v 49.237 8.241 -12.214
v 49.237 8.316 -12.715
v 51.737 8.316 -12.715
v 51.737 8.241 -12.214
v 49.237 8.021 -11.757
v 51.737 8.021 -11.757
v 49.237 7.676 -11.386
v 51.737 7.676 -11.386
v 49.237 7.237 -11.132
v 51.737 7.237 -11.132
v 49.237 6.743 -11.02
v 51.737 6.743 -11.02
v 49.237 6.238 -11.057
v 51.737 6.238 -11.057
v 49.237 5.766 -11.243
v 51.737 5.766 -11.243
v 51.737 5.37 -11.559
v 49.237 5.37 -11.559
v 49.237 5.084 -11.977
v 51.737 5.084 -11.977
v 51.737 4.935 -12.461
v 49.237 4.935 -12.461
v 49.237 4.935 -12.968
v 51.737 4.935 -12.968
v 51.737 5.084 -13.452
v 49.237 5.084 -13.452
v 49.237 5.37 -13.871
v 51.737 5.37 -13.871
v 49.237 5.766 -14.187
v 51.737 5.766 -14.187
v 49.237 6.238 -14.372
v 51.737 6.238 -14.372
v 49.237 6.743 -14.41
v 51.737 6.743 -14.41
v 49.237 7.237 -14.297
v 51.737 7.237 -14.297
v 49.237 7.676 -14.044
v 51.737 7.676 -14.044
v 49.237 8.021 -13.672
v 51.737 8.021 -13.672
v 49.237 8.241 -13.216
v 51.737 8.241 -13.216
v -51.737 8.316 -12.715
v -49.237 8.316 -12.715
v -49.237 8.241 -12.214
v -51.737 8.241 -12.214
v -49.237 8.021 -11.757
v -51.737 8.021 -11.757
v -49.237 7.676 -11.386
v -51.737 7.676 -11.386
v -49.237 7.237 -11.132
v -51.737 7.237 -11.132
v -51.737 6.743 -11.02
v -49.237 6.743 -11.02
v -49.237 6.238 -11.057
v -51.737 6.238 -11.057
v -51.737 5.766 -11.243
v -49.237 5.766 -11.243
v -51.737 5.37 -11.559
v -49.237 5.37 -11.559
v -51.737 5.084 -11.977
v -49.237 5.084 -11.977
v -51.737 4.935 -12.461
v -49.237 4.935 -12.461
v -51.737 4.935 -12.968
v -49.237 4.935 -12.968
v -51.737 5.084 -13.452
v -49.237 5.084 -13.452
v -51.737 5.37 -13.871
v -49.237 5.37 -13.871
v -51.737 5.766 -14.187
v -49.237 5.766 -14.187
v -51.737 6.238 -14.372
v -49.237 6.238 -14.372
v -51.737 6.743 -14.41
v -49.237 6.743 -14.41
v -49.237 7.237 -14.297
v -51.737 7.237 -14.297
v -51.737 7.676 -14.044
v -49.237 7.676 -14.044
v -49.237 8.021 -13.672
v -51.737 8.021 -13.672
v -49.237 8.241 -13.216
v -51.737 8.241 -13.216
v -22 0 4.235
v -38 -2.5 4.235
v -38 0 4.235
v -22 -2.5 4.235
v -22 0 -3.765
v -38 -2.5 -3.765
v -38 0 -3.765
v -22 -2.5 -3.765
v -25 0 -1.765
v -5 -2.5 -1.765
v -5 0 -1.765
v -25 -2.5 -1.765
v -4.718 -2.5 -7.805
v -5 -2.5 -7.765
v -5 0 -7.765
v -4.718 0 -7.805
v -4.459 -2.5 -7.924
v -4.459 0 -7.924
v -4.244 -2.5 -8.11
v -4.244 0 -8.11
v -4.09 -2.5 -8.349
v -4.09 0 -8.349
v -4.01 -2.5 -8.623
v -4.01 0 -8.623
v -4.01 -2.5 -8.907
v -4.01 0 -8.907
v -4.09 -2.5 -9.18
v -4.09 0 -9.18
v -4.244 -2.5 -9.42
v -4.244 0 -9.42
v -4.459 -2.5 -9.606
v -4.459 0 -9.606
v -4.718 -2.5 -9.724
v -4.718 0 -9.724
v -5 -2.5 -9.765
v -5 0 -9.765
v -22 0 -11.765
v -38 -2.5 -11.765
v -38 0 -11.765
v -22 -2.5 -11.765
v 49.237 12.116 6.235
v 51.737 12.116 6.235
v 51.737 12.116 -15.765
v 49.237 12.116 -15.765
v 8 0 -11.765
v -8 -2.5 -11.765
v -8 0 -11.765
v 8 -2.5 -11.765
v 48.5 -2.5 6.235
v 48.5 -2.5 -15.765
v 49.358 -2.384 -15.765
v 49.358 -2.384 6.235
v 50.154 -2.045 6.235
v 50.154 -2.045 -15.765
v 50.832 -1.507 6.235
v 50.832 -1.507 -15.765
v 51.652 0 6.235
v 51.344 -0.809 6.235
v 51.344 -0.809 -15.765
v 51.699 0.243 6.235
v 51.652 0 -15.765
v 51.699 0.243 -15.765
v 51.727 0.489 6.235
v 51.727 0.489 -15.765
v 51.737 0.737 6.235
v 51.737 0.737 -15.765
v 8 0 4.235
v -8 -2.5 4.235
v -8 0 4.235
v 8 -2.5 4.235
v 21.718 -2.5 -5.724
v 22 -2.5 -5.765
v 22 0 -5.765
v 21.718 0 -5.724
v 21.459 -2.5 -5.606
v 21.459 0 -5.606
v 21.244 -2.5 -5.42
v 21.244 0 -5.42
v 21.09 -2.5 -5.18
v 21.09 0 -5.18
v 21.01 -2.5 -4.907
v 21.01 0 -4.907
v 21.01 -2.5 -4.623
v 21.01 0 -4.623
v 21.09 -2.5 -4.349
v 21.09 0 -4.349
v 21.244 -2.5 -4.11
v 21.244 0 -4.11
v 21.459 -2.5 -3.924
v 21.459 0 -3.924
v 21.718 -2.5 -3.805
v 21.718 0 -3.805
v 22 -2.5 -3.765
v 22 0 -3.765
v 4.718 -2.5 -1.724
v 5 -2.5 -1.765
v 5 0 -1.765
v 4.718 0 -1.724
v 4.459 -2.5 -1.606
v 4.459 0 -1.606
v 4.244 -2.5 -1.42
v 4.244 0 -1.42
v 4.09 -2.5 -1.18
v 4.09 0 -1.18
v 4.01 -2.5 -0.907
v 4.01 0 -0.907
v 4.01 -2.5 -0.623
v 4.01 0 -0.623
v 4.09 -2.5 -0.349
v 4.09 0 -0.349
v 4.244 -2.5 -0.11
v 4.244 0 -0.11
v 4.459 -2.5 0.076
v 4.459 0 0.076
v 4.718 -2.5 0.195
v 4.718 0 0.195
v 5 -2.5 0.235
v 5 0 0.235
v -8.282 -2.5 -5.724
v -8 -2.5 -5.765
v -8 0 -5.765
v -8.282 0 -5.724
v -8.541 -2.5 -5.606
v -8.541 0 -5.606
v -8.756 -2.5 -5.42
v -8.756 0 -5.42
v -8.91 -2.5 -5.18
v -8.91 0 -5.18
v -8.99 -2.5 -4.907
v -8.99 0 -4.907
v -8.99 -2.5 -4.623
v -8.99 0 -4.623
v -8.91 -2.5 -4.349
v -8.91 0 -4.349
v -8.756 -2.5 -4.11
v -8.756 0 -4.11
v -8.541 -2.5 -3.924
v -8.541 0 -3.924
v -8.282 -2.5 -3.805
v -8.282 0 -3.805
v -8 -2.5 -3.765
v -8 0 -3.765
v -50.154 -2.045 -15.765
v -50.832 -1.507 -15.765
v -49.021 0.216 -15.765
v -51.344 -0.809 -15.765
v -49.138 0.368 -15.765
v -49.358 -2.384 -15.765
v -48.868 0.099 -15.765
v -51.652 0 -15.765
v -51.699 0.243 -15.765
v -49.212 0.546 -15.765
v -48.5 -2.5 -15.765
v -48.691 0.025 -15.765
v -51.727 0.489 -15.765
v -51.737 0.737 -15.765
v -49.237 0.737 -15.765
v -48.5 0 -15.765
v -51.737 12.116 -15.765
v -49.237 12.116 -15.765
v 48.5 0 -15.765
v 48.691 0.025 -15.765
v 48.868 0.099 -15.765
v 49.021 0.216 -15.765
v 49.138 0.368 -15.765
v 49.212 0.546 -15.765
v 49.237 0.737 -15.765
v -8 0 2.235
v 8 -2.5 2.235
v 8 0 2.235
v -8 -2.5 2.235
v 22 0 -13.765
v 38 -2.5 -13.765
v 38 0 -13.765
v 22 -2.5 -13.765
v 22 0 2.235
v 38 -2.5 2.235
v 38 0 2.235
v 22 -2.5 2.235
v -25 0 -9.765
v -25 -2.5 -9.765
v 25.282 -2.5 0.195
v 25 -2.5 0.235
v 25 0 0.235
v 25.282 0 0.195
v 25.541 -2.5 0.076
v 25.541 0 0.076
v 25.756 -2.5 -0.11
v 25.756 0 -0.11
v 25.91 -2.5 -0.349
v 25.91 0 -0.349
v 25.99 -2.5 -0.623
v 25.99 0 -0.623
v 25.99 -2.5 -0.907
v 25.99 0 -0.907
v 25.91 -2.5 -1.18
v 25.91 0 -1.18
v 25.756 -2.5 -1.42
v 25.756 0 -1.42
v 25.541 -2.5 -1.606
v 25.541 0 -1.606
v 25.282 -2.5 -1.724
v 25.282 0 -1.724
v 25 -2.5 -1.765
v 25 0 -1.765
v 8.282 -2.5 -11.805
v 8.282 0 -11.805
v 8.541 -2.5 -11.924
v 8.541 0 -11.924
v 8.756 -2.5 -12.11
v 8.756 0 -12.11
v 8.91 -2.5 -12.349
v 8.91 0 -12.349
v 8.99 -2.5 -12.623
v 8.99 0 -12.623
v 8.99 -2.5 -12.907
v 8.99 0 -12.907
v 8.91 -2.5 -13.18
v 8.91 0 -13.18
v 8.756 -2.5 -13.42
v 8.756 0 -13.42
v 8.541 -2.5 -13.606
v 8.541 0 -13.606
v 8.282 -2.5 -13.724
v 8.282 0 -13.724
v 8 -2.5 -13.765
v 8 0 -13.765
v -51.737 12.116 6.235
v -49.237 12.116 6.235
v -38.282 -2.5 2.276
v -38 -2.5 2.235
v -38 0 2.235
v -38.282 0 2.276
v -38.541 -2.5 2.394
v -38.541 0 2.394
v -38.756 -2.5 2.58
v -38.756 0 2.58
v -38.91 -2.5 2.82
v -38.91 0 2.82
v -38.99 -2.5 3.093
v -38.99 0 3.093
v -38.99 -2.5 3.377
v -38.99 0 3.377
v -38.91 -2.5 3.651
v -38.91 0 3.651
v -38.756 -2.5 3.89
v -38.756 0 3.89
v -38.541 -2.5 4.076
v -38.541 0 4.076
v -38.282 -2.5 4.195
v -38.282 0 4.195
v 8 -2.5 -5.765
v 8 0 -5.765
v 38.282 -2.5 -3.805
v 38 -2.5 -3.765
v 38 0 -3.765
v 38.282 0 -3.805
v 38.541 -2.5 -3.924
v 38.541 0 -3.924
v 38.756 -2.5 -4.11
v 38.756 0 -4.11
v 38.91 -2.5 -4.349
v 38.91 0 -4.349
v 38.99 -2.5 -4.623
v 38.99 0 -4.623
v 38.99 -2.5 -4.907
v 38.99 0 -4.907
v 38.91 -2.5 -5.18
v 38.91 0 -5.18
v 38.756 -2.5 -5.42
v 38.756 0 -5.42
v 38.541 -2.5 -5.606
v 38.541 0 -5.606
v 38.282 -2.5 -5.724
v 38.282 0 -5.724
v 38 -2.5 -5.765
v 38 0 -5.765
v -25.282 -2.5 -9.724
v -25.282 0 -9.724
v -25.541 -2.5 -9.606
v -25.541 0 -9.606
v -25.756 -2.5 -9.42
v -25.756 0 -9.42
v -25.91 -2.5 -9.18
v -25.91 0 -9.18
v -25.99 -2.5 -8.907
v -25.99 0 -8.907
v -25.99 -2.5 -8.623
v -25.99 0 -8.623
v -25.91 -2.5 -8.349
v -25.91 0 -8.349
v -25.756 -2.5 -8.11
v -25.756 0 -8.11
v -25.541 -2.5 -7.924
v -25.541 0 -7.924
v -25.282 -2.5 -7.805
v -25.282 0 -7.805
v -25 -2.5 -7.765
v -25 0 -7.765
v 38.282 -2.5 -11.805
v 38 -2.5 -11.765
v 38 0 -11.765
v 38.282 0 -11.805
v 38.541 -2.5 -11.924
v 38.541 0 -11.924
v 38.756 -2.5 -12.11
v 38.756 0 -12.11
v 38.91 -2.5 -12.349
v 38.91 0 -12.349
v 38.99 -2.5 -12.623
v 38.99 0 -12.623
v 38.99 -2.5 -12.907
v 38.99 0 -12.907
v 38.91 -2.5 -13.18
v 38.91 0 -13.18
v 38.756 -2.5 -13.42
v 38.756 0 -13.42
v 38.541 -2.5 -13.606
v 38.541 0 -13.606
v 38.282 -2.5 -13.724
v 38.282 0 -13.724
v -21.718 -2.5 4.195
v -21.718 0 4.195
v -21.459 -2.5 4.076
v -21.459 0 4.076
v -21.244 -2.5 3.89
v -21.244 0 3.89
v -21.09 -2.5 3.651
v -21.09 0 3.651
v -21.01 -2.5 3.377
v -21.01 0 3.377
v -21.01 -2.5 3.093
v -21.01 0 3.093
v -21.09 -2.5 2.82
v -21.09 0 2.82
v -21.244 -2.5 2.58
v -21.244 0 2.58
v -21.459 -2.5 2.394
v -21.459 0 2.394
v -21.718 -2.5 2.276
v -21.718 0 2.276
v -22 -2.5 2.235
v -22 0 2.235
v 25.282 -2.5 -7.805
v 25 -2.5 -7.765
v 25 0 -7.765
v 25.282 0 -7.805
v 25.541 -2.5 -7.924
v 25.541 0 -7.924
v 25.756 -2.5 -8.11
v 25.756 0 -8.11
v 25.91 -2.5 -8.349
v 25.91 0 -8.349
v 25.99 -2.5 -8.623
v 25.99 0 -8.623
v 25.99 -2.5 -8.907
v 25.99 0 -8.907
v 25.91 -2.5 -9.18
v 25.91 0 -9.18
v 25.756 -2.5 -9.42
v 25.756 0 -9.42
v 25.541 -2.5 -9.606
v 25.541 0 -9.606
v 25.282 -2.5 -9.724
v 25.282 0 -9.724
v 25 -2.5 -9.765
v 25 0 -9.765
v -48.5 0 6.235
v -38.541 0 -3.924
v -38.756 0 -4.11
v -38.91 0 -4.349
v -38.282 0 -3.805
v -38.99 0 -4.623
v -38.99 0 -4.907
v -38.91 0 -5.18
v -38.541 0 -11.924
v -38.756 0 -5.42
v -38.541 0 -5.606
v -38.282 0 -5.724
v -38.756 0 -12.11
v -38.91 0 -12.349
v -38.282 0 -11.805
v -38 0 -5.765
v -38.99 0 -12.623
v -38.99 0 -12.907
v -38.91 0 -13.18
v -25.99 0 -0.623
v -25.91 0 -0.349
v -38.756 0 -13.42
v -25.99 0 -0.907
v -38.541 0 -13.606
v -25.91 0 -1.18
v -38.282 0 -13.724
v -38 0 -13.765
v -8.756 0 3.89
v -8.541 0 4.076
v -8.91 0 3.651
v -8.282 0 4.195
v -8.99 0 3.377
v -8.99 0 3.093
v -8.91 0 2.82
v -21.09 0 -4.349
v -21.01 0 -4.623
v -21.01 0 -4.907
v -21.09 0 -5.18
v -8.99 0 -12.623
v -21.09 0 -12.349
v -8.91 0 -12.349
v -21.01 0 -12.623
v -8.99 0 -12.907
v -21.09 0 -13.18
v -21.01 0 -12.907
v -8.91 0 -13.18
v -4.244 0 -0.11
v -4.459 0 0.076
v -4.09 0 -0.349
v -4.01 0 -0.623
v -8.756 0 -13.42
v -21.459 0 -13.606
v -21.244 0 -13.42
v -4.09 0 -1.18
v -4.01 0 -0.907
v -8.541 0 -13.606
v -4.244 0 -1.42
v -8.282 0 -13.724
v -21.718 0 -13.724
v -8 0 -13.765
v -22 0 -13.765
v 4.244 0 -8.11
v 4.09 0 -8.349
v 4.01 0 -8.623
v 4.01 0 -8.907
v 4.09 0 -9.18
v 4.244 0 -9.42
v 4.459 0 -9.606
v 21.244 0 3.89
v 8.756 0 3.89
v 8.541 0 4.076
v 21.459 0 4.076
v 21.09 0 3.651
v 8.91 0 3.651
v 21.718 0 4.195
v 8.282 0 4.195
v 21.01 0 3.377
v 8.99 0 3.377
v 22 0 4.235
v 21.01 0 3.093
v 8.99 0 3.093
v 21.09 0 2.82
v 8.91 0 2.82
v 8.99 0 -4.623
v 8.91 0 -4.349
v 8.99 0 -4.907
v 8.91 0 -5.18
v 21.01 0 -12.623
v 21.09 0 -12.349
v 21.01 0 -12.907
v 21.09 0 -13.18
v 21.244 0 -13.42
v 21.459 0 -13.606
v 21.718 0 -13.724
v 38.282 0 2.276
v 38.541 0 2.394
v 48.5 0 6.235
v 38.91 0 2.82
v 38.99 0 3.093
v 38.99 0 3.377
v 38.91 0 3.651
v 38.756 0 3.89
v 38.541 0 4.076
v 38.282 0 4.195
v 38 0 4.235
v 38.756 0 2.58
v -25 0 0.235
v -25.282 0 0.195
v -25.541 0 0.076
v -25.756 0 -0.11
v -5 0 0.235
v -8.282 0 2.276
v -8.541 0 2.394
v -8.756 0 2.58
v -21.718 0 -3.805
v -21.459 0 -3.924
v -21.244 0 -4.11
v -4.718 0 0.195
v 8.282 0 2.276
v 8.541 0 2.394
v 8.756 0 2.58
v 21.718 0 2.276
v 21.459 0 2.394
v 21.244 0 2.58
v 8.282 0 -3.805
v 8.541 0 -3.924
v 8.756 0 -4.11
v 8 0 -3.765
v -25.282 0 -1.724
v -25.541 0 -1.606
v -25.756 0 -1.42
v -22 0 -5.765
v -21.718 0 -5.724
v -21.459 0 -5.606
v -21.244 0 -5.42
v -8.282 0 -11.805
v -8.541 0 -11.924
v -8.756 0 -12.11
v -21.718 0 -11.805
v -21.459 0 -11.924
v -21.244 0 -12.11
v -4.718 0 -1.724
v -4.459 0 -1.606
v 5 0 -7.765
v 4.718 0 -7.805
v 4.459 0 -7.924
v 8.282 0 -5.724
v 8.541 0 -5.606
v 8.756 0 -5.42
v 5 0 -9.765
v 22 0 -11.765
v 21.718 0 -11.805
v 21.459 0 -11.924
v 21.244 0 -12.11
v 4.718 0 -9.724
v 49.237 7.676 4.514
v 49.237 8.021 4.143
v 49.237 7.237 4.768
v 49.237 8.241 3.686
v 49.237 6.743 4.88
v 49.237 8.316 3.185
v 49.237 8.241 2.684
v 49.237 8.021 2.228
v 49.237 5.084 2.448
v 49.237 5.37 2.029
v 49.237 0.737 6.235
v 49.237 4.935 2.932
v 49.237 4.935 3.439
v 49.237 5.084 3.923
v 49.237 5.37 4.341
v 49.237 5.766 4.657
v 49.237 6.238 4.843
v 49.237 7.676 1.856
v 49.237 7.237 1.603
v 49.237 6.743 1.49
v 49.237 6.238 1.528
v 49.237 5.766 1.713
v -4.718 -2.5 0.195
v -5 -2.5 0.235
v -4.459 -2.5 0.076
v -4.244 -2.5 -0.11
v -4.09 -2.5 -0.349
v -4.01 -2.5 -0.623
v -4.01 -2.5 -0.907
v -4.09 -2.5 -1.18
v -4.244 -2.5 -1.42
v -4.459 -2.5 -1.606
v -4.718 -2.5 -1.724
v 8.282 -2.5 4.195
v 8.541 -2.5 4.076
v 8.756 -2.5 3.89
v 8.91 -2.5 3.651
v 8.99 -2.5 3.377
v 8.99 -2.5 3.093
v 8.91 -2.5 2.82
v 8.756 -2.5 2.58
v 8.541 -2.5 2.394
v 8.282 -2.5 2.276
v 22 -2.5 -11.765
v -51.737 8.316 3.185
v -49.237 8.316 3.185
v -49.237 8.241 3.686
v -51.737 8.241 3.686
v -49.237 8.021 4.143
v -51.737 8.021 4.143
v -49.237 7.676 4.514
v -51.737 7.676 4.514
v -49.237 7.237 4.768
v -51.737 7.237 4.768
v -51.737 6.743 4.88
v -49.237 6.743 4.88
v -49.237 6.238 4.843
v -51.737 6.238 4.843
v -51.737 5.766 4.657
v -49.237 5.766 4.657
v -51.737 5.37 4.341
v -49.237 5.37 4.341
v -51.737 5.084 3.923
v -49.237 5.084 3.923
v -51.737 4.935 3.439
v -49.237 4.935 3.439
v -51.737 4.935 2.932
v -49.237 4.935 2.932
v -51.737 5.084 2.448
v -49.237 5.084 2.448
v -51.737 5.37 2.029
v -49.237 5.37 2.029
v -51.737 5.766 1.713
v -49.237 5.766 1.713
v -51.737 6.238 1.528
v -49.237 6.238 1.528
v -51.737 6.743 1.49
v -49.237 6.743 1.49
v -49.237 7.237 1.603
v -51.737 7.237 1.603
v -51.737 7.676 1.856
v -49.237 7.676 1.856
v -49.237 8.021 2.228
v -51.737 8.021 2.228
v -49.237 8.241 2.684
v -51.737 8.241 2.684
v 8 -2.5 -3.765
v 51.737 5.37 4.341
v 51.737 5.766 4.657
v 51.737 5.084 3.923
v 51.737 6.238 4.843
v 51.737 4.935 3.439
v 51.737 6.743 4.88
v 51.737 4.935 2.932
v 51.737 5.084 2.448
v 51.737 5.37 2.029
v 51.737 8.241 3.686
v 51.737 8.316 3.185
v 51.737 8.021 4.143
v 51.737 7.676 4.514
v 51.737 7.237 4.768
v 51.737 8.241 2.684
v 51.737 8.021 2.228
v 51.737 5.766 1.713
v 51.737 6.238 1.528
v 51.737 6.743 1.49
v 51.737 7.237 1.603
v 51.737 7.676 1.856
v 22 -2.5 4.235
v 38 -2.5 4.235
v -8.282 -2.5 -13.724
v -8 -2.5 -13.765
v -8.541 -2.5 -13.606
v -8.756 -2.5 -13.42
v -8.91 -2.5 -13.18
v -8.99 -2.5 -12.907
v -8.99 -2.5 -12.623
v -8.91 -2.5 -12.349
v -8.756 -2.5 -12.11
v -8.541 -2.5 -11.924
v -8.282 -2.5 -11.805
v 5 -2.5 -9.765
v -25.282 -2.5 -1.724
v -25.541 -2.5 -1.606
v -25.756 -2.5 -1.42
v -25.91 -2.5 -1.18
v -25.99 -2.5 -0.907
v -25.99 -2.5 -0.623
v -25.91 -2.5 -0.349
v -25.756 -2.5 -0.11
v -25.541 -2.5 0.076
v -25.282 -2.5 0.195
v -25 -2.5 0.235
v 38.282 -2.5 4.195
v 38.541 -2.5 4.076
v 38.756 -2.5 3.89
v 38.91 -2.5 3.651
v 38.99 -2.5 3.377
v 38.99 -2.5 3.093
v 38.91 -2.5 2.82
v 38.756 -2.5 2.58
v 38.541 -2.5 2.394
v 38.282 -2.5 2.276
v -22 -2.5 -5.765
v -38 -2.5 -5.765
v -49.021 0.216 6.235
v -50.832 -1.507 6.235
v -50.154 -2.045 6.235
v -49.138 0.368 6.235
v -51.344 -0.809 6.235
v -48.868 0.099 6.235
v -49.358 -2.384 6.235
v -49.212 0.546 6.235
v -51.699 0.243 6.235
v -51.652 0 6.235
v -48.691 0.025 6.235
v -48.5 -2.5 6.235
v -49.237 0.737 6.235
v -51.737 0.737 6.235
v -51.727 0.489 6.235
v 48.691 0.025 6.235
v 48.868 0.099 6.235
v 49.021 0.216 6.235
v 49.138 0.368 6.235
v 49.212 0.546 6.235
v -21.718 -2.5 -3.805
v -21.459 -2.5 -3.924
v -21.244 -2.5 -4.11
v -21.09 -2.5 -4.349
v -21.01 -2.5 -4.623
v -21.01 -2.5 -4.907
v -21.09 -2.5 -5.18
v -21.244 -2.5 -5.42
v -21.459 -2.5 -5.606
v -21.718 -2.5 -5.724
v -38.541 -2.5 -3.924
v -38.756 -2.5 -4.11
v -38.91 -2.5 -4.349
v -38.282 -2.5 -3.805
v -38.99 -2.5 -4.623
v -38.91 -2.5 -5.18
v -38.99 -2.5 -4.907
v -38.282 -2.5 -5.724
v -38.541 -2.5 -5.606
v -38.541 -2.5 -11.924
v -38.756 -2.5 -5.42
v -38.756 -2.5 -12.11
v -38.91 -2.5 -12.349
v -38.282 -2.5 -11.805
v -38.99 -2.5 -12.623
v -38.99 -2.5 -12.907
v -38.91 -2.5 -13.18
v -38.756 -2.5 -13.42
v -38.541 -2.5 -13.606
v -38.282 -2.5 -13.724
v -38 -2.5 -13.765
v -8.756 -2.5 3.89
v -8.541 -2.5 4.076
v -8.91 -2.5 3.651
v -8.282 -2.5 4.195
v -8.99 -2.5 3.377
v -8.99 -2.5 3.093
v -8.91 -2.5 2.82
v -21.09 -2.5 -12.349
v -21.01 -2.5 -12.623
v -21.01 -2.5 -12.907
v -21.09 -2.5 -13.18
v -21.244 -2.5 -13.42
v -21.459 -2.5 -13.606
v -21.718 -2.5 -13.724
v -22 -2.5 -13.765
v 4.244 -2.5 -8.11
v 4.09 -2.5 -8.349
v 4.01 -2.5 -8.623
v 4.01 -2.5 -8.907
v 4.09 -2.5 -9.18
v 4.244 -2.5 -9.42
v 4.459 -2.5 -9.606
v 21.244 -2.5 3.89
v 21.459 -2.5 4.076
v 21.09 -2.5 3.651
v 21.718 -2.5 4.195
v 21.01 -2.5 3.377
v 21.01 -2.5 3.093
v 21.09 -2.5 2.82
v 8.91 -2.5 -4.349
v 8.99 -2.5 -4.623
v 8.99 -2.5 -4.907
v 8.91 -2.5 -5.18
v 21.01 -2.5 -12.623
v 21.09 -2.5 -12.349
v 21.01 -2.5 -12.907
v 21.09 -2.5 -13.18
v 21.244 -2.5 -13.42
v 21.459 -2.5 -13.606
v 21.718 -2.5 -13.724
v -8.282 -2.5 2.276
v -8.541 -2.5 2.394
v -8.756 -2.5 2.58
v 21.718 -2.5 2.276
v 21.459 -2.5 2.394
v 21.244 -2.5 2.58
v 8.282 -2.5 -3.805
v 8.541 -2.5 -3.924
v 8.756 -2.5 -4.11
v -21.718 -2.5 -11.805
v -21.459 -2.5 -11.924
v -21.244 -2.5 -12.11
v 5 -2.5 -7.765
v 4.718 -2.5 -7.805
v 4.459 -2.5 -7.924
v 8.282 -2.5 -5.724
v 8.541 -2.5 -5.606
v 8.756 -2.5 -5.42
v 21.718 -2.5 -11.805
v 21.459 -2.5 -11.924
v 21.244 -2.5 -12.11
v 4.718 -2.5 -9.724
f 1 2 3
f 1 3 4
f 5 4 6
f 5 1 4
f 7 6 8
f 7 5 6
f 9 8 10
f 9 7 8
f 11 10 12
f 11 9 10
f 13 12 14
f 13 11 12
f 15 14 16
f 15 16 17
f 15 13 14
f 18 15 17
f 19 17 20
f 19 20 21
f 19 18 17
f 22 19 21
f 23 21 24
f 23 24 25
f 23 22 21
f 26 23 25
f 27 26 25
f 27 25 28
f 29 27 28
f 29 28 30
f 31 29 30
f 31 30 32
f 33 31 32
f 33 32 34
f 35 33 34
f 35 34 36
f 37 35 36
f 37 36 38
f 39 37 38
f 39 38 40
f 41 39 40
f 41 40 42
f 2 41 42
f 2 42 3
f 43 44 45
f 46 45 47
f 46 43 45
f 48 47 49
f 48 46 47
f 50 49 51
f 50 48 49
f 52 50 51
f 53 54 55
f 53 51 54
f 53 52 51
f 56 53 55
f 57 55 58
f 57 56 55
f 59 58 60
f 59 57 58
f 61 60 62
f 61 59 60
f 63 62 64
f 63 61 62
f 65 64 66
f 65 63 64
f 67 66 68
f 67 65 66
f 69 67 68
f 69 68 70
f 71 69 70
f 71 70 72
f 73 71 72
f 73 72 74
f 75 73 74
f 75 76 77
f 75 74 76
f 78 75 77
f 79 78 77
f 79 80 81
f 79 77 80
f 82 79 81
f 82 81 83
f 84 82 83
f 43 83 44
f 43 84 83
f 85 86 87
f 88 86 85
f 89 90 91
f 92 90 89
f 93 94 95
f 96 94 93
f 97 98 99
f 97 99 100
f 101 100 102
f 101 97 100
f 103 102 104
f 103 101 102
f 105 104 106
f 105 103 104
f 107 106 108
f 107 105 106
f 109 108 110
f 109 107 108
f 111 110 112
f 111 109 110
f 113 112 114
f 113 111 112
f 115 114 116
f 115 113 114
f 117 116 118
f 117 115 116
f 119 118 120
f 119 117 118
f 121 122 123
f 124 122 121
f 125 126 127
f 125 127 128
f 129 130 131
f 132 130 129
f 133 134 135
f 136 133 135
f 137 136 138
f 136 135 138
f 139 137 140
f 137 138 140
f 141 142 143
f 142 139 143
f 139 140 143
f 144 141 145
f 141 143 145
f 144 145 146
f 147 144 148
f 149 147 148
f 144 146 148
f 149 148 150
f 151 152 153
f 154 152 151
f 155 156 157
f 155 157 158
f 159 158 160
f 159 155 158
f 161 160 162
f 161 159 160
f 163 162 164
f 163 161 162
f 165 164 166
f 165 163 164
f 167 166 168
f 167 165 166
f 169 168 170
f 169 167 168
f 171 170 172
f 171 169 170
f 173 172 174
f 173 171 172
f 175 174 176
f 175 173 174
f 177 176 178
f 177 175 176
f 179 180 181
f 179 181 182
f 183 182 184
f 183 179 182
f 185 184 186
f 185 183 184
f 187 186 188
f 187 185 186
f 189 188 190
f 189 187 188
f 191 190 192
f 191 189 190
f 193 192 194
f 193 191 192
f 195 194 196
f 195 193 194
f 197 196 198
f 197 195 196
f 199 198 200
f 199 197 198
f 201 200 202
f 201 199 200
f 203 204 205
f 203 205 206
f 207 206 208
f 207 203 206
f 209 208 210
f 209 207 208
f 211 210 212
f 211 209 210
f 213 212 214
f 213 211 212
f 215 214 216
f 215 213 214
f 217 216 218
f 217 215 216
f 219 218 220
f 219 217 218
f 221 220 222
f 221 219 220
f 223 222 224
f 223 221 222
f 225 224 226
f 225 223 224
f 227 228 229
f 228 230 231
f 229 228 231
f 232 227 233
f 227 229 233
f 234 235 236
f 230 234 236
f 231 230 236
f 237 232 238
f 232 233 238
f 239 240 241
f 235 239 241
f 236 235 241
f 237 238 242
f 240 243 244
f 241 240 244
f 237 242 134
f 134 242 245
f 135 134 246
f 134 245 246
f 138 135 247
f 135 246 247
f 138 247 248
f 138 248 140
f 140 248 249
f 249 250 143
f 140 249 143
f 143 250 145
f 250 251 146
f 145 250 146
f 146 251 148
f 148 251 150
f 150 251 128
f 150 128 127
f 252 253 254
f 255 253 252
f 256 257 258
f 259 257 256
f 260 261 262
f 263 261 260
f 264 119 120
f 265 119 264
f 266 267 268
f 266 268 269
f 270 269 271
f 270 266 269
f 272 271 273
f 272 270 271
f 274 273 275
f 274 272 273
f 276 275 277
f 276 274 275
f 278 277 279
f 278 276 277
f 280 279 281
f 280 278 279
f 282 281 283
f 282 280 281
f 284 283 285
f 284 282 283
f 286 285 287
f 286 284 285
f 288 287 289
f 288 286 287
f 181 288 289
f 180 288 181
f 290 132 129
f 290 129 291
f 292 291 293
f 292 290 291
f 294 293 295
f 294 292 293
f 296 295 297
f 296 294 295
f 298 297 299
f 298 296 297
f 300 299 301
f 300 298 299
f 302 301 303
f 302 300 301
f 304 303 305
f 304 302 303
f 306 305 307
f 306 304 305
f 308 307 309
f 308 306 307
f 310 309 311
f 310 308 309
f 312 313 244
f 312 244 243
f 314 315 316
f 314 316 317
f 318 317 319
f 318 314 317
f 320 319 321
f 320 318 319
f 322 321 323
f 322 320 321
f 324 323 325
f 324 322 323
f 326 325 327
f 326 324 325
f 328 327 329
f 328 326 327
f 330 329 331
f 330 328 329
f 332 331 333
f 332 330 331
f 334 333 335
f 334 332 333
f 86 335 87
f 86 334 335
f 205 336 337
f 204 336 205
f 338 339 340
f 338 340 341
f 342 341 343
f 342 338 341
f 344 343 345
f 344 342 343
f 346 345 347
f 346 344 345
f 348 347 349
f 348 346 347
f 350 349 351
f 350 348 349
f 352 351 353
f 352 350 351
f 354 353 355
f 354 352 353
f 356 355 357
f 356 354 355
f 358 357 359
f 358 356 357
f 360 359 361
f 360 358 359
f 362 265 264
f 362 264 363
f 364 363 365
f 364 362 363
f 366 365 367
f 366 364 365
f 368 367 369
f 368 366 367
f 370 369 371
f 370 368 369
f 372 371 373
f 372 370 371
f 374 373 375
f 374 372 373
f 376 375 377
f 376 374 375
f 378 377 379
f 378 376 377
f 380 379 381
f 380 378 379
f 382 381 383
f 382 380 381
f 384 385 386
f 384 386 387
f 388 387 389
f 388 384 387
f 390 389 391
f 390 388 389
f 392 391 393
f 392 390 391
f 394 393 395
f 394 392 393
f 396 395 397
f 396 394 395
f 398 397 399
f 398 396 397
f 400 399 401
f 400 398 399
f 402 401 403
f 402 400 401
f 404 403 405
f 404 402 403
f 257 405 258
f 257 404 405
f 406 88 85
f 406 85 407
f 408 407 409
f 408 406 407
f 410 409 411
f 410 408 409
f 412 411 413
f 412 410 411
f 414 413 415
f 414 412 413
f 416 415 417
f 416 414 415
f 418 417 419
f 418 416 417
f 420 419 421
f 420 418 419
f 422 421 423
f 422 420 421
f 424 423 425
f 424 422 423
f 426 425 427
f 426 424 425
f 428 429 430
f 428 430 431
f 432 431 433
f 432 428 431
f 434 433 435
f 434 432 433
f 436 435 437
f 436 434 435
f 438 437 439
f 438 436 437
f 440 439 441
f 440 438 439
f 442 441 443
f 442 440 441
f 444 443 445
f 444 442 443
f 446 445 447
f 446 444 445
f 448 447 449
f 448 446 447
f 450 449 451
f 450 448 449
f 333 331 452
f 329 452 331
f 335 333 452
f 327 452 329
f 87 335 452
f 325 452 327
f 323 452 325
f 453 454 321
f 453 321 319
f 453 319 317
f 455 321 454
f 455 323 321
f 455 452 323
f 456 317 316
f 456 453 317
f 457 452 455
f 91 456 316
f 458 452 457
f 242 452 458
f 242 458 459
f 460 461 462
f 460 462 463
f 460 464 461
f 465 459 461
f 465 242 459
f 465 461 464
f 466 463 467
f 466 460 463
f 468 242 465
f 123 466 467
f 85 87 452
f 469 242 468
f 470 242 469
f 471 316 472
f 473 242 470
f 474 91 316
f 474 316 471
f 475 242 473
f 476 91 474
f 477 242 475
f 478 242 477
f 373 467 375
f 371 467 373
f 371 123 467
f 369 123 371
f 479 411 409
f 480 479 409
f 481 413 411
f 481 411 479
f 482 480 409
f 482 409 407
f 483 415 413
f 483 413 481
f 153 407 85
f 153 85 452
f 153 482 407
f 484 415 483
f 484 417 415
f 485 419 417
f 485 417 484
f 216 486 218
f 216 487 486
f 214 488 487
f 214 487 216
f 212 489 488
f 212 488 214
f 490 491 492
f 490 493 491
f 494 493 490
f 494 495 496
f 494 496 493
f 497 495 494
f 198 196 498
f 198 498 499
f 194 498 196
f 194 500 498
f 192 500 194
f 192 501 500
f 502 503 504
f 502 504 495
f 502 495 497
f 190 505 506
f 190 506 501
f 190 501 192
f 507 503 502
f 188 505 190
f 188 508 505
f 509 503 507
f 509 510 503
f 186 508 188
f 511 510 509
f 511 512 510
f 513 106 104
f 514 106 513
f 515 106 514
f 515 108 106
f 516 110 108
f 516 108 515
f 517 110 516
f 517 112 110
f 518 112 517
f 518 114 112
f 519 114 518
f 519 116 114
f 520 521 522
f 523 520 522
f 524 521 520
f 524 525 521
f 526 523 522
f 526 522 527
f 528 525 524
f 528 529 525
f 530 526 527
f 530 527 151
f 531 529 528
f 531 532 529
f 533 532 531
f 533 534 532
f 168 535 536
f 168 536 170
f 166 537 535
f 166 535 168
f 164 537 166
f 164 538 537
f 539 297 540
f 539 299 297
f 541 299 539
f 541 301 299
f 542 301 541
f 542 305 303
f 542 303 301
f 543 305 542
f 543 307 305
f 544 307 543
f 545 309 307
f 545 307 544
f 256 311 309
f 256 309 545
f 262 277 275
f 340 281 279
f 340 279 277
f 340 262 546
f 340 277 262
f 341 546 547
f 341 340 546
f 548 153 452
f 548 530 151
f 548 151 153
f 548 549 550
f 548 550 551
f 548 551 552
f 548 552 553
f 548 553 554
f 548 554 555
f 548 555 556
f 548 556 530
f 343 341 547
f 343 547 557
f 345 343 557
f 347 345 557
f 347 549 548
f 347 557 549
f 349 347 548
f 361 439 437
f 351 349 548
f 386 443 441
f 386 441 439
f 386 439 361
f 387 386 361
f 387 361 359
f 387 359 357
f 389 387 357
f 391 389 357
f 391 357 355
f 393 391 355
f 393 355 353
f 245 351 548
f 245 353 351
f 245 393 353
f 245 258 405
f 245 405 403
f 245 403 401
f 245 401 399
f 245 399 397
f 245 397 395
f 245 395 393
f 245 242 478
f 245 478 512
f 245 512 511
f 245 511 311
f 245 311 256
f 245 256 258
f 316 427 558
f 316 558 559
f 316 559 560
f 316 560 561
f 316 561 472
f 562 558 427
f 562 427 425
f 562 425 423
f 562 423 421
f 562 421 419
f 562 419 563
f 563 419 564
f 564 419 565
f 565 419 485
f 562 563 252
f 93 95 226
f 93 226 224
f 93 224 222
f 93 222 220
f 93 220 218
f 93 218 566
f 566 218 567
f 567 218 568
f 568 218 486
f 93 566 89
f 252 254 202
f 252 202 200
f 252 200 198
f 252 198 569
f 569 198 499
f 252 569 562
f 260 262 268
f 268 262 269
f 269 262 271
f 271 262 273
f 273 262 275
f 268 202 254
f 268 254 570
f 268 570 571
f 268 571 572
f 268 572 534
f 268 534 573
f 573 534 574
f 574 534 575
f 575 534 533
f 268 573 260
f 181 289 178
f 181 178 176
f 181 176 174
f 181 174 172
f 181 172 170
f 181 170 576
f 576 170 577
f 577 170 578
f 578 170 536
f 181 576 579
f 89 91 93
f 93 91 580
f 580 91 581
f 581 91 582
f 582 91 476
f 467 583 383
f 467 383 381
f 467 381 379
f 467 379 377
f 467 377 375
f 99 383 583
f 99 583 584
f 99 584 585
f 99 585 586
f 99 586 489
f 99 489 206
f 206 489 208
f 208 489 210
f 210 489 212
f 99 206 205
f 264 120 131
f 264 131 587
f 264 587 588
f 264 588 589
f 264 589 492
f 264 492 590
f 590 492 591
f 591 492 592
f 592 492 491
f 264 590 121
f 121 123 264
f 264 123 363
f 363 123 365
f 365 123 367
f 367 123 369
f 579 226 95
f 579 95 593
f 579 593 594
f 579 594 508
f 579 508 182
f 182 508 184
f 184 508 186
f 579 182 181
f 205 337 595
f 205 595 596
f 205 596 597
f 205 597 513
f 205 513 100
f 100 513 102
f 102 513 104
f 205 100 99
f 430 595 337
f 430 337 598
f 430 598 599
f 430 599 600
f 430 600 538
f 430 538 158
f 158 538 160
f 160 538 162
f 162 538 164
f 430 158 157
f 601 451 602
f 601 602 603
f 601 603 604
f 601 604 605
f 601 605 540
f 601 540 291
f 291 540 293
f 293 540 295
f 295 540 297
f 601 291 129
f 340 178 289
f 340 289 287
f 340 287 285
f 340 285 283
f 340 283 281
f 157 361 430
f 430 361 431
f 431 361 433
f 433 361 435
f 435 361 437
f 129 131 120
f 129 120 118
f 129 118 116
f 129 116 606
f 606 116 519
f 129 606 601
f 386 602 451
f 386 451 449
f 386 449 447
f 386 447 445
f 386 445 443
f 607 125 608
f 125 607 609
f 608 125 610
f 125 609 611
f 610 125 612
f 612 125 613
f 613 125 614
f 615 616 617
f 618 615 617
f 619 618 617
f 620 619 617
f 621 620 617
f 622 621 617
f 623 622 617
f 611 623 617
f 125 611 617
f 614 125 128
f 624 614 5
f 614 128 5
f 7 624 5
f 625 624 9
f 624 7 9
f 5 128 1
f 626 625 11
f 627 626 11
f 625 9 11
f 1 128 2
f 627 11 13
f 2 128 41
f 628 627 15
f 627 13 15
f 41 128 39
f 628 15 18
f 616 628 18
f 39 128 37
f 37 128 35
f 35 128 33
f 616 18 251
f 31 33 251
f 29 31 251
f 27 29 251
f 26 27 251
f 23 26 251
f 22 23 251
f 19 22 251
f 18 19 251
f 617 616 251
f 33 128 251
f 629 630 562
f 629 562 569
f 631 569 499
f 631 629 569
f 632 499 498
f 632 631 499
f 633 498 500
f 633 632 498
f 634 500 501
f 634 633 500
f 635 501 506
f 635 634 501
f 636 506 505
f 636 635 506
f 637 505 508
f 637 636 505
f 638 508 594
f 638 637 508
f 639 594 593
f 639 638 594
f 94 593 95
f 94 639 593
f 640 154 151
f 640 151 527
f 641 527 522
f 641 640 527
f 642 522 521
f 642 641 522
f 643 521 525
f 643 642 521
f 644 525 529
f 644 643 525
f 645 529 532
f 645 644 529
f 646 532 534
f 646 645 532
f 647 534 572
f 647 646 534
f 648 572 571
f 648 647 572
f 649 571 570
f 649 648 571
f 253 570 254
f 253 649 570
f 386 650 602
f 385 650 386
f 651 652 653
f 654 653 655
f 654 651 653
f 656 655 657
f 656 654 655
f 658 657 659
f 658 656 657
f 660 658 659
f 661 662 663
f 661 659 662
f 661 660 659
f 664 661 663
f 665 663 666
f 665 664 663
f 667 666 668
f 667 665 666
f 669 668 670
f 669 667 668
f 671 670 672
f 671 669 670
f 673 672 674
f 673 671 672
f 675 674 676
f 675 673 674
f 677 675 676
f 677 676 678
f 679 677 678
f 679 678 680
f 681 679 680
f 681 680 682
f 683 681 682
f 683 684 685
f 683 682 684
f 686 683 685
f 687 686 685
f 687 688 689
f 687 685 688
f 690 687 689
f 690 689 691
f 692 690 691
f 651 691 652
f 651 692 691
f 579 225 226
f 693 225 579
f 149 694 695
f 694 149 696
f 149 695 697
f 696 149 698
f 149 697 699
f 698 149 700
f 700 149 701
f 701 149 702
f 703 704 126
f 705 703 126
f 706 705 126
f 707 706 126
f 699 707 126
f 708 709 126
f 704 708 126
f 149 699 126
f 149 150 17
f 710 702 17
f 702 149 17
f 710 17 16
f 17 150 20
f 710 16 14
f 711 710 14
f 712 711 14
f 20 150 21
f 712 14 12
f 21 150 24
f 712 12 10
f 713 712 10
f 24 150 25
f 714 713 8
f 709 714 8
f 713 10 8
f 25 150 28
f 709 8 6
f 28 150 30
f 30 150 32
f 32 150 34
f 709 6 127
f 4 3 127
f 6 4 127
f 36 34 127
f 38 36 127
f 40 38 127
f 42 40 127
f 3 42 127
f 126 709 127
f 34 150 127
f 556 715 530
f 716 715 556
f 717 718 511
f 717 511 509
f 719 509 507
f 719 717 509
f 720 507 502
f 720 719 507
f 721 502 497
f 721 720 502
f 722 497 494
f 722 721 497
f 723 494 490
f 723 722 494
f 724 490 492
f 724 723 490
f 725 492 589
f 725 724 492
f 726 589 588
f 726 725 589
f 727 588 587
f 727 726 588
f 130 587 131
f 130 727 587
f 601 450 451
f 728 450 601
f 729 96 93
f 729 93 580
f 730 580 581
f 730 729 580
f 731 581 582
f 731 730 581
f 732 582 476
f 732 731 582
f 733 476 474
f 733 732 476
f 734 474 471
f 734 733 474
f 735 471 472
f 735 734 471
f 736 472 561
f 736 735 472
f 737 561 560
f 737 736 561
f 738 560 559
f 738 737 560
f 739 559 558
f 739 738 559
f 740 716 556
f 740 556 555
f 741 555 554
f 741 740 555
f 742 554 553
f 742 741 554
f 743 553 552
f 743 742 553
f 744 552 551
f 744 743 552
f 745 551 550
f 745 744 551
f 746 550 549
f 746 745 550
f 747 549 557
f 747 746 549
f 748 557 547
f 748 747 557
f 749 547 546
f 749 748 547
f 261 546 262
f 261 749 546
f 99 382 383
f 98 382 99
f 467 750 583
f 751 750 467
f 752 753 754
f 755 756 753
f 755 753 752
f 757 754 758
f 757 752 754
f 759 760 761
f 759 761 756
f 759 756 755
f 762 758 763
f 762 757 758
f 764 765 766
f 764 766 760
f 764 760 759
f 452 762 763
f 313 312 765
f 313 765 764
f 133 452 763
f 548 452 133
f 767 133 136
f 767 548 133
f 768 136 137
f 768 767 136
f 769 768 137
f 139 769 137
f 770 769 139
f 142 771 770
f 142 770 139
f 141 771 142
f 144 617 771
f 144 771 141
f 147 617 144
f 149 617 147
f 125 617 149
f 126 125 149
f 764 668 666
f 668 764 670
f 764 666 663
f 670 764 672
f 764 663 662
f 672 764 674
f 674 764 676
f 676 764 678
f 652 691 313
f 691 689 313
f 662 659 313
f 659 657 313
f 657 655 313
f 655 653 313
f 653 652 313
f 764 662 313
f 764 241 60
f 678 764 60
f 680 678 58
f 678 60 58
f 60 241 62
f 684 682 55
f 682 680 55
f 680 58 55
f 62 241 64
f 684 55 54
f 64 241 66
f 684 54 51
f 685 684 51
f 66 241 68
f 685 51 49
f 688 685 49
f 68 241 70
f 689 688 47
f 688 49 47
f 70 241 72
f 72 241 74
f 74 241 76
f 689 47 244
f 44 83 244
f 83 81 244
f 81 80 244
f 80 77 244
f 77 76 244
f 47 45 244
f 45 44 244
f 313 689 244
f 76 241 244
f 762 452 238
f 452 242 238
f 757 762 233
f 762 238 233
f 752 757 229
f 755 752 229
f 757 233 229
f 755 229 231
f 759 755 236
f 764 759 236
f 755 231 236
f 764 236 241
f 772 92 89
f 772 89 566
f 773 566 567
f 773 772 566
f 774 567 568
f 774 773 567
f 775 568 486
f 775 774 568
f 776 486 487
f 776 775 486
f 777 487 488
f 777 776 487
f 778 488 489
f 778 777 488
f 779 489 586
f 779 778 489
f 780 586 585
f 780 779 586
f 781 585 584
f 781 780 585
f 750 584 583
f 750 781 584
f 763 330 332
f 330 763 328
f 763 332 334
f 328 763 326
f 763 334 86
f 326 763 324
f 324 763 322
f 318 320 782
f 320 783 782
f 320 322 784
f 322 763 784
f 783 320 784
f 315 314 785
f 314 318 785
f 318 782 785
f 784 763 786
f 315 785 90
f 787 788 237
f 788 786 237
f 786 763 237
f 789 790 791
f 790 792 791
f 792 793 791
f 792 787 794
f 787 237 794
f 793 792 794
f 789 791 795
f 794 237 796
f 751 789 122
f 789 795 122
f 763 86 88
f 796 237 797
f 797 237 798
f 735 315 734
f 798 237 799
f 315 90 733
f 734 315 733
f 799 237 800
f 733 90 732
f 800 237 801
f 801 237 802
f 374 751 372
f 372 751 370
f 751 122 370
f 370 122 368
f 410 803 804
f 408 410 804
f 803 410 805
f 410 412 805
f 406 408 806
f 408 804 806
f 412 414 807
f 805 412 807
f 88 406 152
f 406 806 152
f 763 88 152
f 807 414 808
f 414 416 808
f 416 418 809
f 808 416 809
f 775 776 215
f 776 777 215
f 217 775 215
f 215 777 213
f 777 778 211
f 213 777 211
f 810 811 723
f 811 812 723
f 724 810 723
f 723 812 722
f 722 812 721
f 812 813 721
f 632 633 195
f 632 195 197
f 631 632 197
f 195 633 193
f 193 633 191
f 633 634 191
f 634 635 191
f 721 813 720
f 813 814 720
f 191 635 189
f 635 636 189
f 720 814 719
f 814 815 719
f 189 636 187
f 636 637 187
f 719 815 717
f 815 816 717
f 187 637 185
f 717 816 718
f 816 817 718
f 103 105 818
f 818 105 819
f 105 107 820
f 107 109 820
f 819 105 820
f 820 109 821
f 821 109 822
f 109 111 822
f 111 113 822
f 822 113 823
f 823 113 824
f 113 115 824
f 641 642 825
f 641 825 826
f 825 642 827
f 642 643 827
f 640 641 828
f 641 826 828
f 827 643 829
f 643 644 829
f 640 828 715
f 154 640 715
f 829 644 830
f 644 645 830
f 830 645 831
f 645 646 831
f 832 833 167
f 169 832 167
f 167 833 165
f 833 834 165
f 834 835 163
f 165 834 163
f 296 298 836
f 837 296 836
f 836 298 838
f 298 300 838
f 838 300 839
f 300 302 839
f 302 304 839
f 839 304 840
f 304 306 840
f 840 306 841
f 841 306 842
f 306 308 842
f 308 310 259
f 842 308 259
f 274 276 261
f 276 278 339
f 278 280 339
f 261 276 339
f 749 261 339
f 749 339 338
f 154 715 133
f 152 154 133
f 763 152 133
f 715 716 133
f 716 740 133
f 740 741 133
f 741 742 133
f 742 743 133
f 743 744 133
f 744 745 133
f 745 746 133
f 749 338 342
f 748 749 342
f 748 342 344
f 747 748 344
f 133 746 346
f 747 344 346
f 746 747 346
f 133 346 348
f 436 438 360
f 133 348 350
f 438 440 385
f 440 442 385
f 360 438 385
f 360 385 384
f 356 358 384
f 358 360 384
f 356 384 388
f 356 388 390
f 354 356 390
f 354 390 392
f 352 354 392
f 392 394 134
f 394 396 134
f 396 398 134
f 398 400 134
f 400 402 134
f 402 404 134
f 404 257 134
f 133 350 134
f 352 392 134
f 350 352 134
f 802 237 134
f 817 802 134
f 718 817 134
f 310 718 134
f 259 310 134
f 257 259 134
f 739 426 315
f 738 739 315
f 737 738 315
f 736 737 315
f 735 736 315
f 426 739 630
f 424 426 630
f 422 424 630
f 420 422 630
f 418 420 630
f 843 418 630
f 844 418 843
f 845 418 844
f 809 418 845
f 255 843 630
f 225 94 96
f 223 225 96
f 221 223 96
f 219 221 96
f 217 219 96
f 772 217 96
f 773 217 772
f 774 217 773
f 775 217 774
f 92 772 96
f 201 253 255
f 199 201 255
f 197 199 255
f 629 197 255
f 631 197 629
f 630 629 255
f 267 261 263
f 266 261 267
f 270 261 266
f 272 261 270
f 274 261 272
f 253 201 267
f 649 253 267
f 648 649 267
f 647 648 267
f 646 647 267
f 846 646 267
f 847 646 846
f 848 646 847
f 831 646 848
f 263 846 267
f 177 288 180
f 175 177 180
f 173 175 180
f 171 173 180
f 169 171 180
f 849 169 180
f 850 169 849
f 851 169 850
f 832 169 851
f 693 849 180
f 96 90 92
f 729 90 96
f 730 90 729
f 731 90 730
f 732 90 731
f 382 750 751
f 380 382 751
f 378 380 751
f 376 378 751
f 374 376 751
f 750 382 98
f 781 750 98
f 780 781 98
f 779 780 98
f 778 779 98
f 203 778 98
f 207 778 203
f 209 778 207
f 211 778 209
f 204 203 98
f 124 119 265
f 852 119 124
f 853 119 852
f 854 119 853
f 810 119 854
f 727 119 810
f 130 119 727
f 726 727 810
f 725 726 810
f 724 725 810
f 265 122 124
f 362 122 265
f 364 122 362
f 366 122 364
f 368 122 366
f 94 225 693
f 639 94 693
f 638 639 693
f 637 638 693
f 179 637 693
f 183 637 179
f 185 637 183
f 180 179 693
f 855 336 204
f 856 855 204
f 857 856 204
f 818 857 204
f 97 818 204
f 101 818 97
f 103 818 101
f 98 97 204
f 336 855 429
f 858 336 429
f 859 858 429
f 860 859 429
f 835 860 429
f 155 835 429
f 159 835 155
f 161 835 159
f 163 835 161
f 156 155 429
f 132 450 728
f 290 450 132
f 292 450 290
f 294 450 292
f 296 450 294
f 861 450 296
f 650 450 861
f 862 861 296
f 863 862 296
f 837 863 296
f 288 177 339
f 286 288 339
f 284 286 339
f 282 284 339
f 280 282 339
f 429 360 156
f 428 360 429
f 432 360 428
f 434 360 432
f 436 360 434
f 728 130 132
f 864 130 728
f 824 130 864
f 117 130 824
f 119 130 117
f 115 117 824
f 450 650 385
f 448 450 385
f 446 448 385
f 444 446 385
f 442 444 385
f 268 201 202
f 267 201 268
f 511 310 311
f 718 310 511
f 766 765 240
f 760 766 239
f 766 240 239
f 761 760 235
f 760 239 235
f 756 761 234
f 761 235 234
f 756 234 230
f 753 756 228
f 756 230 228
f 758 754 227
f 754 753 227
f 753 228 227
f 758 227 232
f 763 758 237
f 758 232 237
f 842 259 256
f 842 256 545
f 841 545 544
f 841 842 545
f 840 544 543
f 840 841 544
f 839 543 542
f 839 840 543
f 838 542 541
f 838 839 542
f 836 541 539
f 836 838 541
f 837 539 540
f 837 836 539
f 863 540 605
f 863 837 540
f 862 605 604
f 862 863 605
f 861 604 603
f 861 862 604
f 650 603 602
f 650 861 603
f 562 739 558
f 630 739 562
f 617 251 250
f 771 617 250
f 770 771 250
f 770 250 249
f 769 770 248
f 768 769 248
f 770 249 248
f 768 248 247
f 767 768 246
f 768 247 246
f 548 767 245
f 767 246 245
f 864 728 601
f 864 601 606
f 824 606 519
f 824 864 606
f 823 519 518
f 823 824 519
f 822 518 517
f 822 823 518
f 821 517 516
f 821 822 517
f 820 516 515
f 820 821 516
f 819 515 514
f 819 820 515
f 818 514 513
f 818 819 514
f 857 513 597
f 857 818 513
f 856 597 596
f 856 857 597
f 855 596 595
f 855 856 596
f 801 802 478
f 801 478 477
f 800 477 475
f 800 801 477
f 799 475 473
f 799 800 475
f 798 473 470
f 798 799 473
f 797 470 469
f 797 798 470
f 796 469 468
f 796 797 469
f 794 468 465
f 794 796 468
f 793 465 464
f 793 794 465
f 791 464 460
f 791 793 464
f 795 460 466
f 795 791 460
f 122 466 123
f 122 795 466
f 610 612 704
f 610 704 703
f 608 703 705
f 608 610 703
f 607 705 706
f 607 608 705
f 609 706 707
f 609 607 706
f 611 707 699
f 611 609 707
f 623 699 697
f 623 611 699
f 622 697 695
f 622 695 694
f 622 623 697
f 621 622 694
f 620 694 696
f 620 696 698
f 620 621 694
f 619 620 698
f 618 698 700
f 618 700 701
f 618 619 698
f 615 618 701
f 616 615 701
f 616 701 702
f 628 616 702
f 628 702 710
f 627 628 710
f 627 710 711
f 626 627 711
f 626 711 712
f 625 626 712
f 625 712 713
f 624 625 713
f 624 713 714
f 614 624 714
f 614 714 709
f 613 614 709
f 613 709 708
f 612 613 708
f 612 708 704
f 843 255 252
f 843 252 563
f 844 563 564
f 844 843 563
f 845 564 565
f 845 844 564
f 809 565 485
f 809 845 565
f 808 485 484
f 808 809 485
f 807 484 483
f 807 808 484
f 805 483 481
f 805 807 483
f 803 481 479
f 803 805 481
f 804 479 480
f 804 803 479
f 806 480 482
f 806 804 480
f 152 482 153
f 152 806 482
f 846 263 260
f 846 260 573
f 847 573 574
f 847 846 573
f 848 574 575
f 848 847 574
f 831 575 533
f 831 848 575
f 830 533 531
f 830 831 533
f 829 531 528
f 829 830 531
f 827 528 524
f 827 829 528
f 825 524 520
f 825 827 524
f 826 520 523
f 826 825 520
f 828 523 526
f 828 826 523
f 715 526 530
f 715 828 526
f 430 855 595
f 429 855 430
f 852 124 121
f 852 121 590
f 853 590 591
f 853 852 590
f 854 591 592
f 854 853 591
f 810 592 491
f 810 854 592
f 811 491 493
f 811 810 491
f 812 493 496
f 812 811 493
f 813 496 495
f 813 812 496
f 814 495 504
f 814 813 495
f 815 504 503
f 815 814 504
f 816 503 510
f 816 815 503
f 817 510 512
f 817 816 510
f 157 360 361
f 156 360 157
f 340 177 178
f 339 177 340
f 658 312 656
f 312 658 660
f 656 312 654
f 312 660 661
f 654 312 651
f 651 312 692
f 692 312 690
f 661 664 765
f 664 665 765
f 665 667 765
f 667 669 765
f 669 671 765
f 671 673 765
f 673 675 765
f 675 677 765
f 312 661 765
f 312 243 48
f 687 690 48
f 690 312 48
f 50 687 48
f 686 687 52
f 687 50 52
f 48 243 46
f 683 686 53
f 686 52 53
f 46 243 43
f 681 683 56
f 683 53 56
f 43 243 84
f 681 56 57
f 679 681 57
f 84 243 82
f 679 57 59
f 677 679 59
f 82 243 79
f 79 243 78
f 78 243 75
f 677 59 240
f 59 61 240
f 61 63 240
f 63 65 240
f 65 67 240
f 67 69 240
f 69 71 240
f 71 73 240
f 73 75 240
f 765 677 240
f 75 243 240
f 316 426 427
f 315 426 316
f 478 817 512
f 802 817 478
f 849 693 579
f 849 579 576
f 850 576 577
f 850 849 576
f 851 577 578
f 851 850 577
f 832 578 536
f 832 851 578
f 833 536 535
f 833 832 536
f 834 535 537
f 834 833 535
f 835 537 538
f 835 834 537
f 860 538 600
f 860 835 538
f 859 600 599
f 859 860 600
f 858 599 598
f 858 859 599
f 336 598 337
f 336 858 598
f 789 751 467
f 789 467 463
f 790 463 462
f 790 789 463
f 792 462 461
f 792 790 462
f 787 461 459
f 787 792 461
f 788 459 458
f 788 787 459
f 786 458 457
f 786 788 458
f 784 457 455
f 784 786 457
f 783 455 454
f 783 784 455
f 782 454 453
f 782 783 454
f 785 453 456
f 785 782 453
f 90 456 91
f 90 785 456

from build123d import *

# Parameters (mm, degrees)
SKETCH_2_W             = 126
SKETCH_2_H             = 22
SKETCH_2_R             = 1.7
SM_BASE_FLANGE_1_DEPTH = 2.5
OTHER_START            = -15.764824005
OTHER_1_DEPTH          = 22
OTHER_START_2          = -11.014823905
OTHER_1_2_DEPTH        = 12.4999998
OTHER_1_3_DEPTH        = 1.3499999
OTHER_START_3          = 4.885176095
OTHER_1_4_DEPTH        = 1.3499999
OTHER_START_4          = -14.414824105
OTHER_1_5_DEPTH        = 19.3000002
OTHER_START_5          = -51.7366
OTHER_1_6_OUTLINE_R    = 1.7
OTHER_1_6_DEPTH        = 103.4732
CUT_EXTRUDE_1_DEPTH    = 57.025302757


with BuildPart() as part:
    # 基体-法兰1: sheet metal written as solids
    # Sketch 2 → 基体-法兰1 (new body)
    with BuildSketch(Plane(origin=(0, 0, 0), x_dir=(1, 0, 0), z_dir=(0, 1, 0))):
        with Locations((0, 4.764824005)):
            Rectangle(SKETCH_2_W, SKETCH_2_H)
        with Locations(Location((57.5, 12.714824005, 0), (0, 0, 270))):
            Circle(SKETCH_2_R, mode=Mode.SUBTRACT)
        with Locations(Location((57.5, -3.185175995, 0), (0, 0, 270))):
            Circle(SKETCH_2_R, mode=Mode.SUBTRACT)
        with Locations(Location((-57.5, -3.185175995, 0), (0, 0, 90))):
            Circle(SKETCH_2_R, mode=Mode.SUBTRACT)
        with Locations(Location((-57.5, 12.714824005, 0), (0, 0, 90))):
            Circle(SKETCH_2_R, mode=Mode.SUBTRACT)
    extrude(amount=-SM_BASE_FLANGE_1_DEPTH)

    # Other 1: read off the stored shape, not the designer's step
    # Other 1 outline → Other 1 (cut)
    with BuildSketch(Plane.XY.offset(OTHER_START)):
        with BuildLine():
            Line((-63, -2.5), (-48.5, -2.5))
            ThreePointArc((-48.5, -2.5), (-50.511404982, -1.799110859), (-51.651666226, 0))
            Line((-51.651666226, 0), (-63, 0))
            Line((-63, 0), (-63, -2.5))
        make_face()
        with BuildLine():
            ThreePointArc((51.651666226, 0), (50.511404982, -1.799110859), (48.5, -2.5))
            Line((48.5, -2.5), (63, -2.5))
            Line((63, -2.5), (63, 0))
            Line((63, 0), (51.651666226, 0))
        make_face()
    extrude(amount=OTHER_1_DEPTH, mode=Mode.SUBTRACT)

    # Other 1 2 outline → Other 1 2 (add)
    with BuildSketch(Plane.XY.offset(OTHER_START_2)):
        with BuildLine():
            ThreePointArc((-51.7366, 0.7366), (-51.715296446, 0.365859759), (-51.651666226, 0))
            Line((-51.651666226, 0), (-48.5, 0))
            ThreePointArc((-48.5, 0), (-49.020854855, 0.215745145), (-49.2366, 0.7366))
            Line((-49.2366, 0.7366), (-49.2366, 12.116056017))
            Line((-49.2366, 12.116056017), (-51.7366, 12.116056017))
            Line((-51.7366, 12.116056017), (-51.7366, 0.7366))
        make_face()
        with BuildLine():
            Line((48.5, 0), (51.651666226, 0))
            ThreePointArc((51.651666226, 0), (51.715296446, 0.365859759), (51.7366, 0.7366))
            Line((51.7366, 0.7366), (51.7366, 12.116056017))
            Line((51.7366, 12.116056017), (49.2366, 12.116056017))
            Line((49.2366, 12.116056017), (49.2366, 0.7366))
            ThreePointArc((49.2366, 0.7366), (49.020854855, 0.215745145), (48.5, 0))
        make_face()
    extrude(amount=OTHER_1_2_DEPTH)

    # Other 1 3 outline → Other 1 3 (add)
    with BuildSketch(Plane.XY.offset(OTHER_START)):
        with BuildLine():
            ThreePointArc((-51.7366, 0.7366), (-51.715296446, 0.365859759), (-51.651666226, 0))
            Line((-51.651666226, 0), (-48.5, 0))
            ThreePointArc((-48.5, 0), (-49.020854855, 0.215745145), (-49.2366, 0.7366))
            Line((-49.2366, 0.7366), (-49.2366, 12.116056017))
            Line((-49.2366, 12.116056017), (-51.7366, 12.116056017))
            Line((-51.7366, 12.116056017), (-51.7366, 0.7366))
        make_face()
        with BuildLine():
            Line((48.5, 0), (51.651666226, 0))
            ThreePointArc((51.651666226, 0), (51.715296446, 0.365859759), (51.7366, 0.7366))
            Line((51.7366, 0.7366), (51.7366, 12.116056017))
            Line((51.7366, 12.116056017), (49.2366, 12.116056017))
            Line((49.2366, 12.116056017), (49.2366, 0.7366))
            ThreePointArc((49.2366, 0.7366), (49.020854855, 0.215745145), (48.5, 0))
        make_face()
    extrude(amount=OTHER_1_3_DEPTH)

    # Other 1 4 outline → Other 1 4 (add)
    with BuildSketch(Plane.XY.offset(OTHER_START_3)):
        with BuildLine():
            ThreePointArc((-51.7366, 0.7366), (-51.715296446, 0.365859759), (-51.651666226, 0))
            Line((-51.651666226, 0), (-48.5, 0))
            ThreePointArc((-48.5, 0), (-49.020854855, 0.215745145), (-49.2366, 0.7366))
            Line((-49.2366, 0.7366), (-49.2366, 12.116056017))
            Line((-49.2366, 12.116056017), (-51.7366, 12.116056017))
            Line((-51.7366, 12.116056017), (-51.7366, 0.7366))
        make_face()
        with BuildLine():
            Line((48.5, 0), (51.651666226, 0))
            ThreePointArc((51.651666226, 0), (51.715296446, 0.365859759), (51.7366, 0.7366))
            Line((51.7366, 0.7366), (51.7366, 12.116056017))
            Line((51.7366, 12.116056017), (49.2366, 12.116056017))
            Line((49.2366, 12.116056017), (49.2366, 0.7366))
            ThreePointArc((49.2366, 0.7366), (49.020854855, 0.215745145), (48.5, 0))
        make_face()
    extrude(amount=OTHER_1_4_DEPTH)

    # Other 1 5 outline → Other 1 5 (add)
    with BuildSketch(Plane.XY.offset(OTHER_START_4)):
        with BuildLine():
            ThreePointArc((49.2366, 0.7366), (49.020854855, 0.215745145), (48.5, 0))
            Line((48.5, 0), (51.651666226, 0))
            ThreePointArc((51.651666226, 0), (51.715296446, 0.365859759), (51.7366, 0.7366))
            Line((51.7366, 0.7366), (51.7366, 12.116056017))
            Line((51.7366, 12.116056017), (49.2366, 12.116056017))
            Line((49.2366, 12.116056017), (49.2366, 0.7366))
        make_face()
        with BuildLine():
            ThreePointArc((-51.7366, 0.7366), (-51.715296446, 0.365859759), (-51.651666226, 0))
            Line((-51.651666226, 0), (-48.5, 0))
            ThreePointArc((-48.5, 0), (-49.020854855, 0.215745145), (-49.2366, 0.7366))
            Line((-49.2366, 0.7366), (-49.2366, 12.116056017))
            Line((-49.2366, 12.116056017), (-51.7366, 12.116056017))
            Line((-51.7366, 12.116056017), (-51.7366, 0.7366))
        make_face()
    extrude(amount=OTHER_1_5_DEPTH)

    # Other 1 6 outline → Other 1 6 (cut)
    with BuildSketch(Plane.YZ.offset(OTHER_START_5)):
        with Locations((6.616056017, -12.714824005)):
            Circle(OTHER_1_6_OUTLINE_R)
        with Locations((6.616056017, 3.185175995)):
            Circle(OTHER_1_6_OUTLINE_R)
    extrude(amount=OTHER_1_6_DEPTH, mode=Mode.SUBTRACT)

    # 草图8 → 切除-拉伸1 (cut, through all)
    with BuildSketch(Plane.XZ.offset(2.5)):
        with BuildLine():
            Line((-8, -3.764824005), (8, -3.764824005))
            ThreePointArc((8, -3.764824005), (9, -4.764824005), (8, -5.764824005))
            Line((8, -5.764824005), (-8, -5.764824005))
            ThreePointArc((-8, -5.764824005), (-9, -4.764824005), (-8, -3.764824005))
        make_face()
        with BuildLine():
            Line((-38, -3.764824005), (-22, -3.764824005))
            ThreePointArc((-22, -3.764824005), (-21, -4.764824005), (-22, -5.764824005))
            Line((-22, -5.764824005), (-38, -5.764824005))
            ThreePointArc((-38, -5.764824005), (-39, -4.764824005), (-38, -3.764824005))
        make_face()
        with BuildLine():
            Line((22, -3.764824005), (38, -3.764824005))
            ThreePointArc((38, -3.764824005), (39, -4.764824005), (38, -5.764824005))
            Line((38, -5.764824005), (22, -5.764824005))
            ThreePointArc((22, -5.764824005), (21, -4.764824005), (22, -3.764824005))
        make_face()
        with BuildLine():
            Line((-8, -11.764824005), (8, -11.764824005))
            ThreePointArc((8, -11.764824005), (9, -12.764824005), (8, -13.764824005))
            Line((8, -13.764824005), (-8, -13.764824005))
            ThreePointArc((-8, -13.764824005), (-9, -12.764824005), (-8, -11.764824005))
        make_face()
        with BuildLine():
            Line((-38, -11.764824005), (-22, -11.764824005))
            ThreePointArc((-22, -11.764824005), (-21, -12.764824005), (-22, -13.764824005))
            Line((-22, -13.764824005), (-38, -13.764824005))
            ThreePointArc((-38, -13.764824005), (-39, -12.764824005), (-38, -11.764824005))
        make_face()
        with BuildLine():
            Line((22, -11.764824005), (38, -11.764824005))
            ThreePointArc((38, -11.764824005), (39, -12.764824005), (38, -13.764824005))
            Line((38, -13.764824005), (22, -13.764824005))
            ThreePointArc((22, -13.764824005), (21, -12.764824005), (22, -11.764824005))
        make_face()
        with BuildLine():
            Line((-8, 4.235175995), (8, 4.235175995))
            ThreePointArc((8, 4.235175995), (9, 3.235175995), (8, 2.235175995))
            Line((8, 2.235175995), (-8, 2.235175995))
            ThreePointArc((-8, 2.235175995), (-9, 3.235175995), (-8, 4.235175995))
        make_face()
        with BuildLine():
            Line((-38, 4.235175995), (-22, 4.235175995))
            ThreePointArc((-22, 4.235175995), (-21, 3.235175995), (-22, 2.235175995))
            Line((-22, 2.235175995), (-38, 2.235175995))
            ThreePointArc((-38, 2.235175995), (-39, 3.235175995), (-38, 4.235175995))
        make_face()
        with BuildLine():
            Line((22, 4.235175995), (38, 4.235175995))
            ThreePointArc((38, 4.235175995), (39, 3.235175995), (38, 2.235175995))
            Line((38, 2.235175995), (22, 2.235175995))
            ThreePointArc((22, 2.235175995), (21, 3.235175995), (22, 4.235175995))
        make_face()
        with BuildLine():
            Line((-25, 0.235175995), (-5, 0.235175995))
            ThreePointArc((-5, 0.235175995), (-4, -0.764824005), (-5, -1.764824005))
            Line((-5, -1.764824005), (-25, -1.764824005))
            ThreePointArc((-25, -1.764824005), (-26, -0.764824005), (-25, 0.235175995))
        make_face()
        with BuildLine():
            Line((5, 0.235175995), (25, 0.235175995))
            ThreePointArc((25, 0.235175995), (26, -0.764824005), (25, -1.764824005))
            Line((25, -1.764824005), (5, -1.764824005))
            ThreePointArc((5, -1.764824005), (4, -0.764824005), (5, 0.235175995))
        make_face()
        with BuildLine():
            Line((-25, -7.764824005), (-5, -7.764824005))
            ThreePointArc((-5, -7.764824005), (-4, -8.764824005), (-5, -9.764824005))
            Line((-5, -9.764824005), (-25, -9.764824005))
            ThreePointArc((-25, -9.764824005), (-26, -8.764824005), (-25, -7.764824005))
        make_face()
        with BuildLine():
            Line((5, -7.764824005), (25, -7.764824005))
            ThreePointArc((25, -7.764824005), (26, -8.764824005), (25, -9.764824005))
            Line((25, -9.764824005), (5, -9.764824005))
            ThreePointArc((5, -9.764824005), (4, -8.764824005), (5, -7.764824005))
        make_face()
    extrude(amount=-CUT_EXTRUDE_1_DEPTH, mode=Mode.SUBTRACT)


solid = part.part
